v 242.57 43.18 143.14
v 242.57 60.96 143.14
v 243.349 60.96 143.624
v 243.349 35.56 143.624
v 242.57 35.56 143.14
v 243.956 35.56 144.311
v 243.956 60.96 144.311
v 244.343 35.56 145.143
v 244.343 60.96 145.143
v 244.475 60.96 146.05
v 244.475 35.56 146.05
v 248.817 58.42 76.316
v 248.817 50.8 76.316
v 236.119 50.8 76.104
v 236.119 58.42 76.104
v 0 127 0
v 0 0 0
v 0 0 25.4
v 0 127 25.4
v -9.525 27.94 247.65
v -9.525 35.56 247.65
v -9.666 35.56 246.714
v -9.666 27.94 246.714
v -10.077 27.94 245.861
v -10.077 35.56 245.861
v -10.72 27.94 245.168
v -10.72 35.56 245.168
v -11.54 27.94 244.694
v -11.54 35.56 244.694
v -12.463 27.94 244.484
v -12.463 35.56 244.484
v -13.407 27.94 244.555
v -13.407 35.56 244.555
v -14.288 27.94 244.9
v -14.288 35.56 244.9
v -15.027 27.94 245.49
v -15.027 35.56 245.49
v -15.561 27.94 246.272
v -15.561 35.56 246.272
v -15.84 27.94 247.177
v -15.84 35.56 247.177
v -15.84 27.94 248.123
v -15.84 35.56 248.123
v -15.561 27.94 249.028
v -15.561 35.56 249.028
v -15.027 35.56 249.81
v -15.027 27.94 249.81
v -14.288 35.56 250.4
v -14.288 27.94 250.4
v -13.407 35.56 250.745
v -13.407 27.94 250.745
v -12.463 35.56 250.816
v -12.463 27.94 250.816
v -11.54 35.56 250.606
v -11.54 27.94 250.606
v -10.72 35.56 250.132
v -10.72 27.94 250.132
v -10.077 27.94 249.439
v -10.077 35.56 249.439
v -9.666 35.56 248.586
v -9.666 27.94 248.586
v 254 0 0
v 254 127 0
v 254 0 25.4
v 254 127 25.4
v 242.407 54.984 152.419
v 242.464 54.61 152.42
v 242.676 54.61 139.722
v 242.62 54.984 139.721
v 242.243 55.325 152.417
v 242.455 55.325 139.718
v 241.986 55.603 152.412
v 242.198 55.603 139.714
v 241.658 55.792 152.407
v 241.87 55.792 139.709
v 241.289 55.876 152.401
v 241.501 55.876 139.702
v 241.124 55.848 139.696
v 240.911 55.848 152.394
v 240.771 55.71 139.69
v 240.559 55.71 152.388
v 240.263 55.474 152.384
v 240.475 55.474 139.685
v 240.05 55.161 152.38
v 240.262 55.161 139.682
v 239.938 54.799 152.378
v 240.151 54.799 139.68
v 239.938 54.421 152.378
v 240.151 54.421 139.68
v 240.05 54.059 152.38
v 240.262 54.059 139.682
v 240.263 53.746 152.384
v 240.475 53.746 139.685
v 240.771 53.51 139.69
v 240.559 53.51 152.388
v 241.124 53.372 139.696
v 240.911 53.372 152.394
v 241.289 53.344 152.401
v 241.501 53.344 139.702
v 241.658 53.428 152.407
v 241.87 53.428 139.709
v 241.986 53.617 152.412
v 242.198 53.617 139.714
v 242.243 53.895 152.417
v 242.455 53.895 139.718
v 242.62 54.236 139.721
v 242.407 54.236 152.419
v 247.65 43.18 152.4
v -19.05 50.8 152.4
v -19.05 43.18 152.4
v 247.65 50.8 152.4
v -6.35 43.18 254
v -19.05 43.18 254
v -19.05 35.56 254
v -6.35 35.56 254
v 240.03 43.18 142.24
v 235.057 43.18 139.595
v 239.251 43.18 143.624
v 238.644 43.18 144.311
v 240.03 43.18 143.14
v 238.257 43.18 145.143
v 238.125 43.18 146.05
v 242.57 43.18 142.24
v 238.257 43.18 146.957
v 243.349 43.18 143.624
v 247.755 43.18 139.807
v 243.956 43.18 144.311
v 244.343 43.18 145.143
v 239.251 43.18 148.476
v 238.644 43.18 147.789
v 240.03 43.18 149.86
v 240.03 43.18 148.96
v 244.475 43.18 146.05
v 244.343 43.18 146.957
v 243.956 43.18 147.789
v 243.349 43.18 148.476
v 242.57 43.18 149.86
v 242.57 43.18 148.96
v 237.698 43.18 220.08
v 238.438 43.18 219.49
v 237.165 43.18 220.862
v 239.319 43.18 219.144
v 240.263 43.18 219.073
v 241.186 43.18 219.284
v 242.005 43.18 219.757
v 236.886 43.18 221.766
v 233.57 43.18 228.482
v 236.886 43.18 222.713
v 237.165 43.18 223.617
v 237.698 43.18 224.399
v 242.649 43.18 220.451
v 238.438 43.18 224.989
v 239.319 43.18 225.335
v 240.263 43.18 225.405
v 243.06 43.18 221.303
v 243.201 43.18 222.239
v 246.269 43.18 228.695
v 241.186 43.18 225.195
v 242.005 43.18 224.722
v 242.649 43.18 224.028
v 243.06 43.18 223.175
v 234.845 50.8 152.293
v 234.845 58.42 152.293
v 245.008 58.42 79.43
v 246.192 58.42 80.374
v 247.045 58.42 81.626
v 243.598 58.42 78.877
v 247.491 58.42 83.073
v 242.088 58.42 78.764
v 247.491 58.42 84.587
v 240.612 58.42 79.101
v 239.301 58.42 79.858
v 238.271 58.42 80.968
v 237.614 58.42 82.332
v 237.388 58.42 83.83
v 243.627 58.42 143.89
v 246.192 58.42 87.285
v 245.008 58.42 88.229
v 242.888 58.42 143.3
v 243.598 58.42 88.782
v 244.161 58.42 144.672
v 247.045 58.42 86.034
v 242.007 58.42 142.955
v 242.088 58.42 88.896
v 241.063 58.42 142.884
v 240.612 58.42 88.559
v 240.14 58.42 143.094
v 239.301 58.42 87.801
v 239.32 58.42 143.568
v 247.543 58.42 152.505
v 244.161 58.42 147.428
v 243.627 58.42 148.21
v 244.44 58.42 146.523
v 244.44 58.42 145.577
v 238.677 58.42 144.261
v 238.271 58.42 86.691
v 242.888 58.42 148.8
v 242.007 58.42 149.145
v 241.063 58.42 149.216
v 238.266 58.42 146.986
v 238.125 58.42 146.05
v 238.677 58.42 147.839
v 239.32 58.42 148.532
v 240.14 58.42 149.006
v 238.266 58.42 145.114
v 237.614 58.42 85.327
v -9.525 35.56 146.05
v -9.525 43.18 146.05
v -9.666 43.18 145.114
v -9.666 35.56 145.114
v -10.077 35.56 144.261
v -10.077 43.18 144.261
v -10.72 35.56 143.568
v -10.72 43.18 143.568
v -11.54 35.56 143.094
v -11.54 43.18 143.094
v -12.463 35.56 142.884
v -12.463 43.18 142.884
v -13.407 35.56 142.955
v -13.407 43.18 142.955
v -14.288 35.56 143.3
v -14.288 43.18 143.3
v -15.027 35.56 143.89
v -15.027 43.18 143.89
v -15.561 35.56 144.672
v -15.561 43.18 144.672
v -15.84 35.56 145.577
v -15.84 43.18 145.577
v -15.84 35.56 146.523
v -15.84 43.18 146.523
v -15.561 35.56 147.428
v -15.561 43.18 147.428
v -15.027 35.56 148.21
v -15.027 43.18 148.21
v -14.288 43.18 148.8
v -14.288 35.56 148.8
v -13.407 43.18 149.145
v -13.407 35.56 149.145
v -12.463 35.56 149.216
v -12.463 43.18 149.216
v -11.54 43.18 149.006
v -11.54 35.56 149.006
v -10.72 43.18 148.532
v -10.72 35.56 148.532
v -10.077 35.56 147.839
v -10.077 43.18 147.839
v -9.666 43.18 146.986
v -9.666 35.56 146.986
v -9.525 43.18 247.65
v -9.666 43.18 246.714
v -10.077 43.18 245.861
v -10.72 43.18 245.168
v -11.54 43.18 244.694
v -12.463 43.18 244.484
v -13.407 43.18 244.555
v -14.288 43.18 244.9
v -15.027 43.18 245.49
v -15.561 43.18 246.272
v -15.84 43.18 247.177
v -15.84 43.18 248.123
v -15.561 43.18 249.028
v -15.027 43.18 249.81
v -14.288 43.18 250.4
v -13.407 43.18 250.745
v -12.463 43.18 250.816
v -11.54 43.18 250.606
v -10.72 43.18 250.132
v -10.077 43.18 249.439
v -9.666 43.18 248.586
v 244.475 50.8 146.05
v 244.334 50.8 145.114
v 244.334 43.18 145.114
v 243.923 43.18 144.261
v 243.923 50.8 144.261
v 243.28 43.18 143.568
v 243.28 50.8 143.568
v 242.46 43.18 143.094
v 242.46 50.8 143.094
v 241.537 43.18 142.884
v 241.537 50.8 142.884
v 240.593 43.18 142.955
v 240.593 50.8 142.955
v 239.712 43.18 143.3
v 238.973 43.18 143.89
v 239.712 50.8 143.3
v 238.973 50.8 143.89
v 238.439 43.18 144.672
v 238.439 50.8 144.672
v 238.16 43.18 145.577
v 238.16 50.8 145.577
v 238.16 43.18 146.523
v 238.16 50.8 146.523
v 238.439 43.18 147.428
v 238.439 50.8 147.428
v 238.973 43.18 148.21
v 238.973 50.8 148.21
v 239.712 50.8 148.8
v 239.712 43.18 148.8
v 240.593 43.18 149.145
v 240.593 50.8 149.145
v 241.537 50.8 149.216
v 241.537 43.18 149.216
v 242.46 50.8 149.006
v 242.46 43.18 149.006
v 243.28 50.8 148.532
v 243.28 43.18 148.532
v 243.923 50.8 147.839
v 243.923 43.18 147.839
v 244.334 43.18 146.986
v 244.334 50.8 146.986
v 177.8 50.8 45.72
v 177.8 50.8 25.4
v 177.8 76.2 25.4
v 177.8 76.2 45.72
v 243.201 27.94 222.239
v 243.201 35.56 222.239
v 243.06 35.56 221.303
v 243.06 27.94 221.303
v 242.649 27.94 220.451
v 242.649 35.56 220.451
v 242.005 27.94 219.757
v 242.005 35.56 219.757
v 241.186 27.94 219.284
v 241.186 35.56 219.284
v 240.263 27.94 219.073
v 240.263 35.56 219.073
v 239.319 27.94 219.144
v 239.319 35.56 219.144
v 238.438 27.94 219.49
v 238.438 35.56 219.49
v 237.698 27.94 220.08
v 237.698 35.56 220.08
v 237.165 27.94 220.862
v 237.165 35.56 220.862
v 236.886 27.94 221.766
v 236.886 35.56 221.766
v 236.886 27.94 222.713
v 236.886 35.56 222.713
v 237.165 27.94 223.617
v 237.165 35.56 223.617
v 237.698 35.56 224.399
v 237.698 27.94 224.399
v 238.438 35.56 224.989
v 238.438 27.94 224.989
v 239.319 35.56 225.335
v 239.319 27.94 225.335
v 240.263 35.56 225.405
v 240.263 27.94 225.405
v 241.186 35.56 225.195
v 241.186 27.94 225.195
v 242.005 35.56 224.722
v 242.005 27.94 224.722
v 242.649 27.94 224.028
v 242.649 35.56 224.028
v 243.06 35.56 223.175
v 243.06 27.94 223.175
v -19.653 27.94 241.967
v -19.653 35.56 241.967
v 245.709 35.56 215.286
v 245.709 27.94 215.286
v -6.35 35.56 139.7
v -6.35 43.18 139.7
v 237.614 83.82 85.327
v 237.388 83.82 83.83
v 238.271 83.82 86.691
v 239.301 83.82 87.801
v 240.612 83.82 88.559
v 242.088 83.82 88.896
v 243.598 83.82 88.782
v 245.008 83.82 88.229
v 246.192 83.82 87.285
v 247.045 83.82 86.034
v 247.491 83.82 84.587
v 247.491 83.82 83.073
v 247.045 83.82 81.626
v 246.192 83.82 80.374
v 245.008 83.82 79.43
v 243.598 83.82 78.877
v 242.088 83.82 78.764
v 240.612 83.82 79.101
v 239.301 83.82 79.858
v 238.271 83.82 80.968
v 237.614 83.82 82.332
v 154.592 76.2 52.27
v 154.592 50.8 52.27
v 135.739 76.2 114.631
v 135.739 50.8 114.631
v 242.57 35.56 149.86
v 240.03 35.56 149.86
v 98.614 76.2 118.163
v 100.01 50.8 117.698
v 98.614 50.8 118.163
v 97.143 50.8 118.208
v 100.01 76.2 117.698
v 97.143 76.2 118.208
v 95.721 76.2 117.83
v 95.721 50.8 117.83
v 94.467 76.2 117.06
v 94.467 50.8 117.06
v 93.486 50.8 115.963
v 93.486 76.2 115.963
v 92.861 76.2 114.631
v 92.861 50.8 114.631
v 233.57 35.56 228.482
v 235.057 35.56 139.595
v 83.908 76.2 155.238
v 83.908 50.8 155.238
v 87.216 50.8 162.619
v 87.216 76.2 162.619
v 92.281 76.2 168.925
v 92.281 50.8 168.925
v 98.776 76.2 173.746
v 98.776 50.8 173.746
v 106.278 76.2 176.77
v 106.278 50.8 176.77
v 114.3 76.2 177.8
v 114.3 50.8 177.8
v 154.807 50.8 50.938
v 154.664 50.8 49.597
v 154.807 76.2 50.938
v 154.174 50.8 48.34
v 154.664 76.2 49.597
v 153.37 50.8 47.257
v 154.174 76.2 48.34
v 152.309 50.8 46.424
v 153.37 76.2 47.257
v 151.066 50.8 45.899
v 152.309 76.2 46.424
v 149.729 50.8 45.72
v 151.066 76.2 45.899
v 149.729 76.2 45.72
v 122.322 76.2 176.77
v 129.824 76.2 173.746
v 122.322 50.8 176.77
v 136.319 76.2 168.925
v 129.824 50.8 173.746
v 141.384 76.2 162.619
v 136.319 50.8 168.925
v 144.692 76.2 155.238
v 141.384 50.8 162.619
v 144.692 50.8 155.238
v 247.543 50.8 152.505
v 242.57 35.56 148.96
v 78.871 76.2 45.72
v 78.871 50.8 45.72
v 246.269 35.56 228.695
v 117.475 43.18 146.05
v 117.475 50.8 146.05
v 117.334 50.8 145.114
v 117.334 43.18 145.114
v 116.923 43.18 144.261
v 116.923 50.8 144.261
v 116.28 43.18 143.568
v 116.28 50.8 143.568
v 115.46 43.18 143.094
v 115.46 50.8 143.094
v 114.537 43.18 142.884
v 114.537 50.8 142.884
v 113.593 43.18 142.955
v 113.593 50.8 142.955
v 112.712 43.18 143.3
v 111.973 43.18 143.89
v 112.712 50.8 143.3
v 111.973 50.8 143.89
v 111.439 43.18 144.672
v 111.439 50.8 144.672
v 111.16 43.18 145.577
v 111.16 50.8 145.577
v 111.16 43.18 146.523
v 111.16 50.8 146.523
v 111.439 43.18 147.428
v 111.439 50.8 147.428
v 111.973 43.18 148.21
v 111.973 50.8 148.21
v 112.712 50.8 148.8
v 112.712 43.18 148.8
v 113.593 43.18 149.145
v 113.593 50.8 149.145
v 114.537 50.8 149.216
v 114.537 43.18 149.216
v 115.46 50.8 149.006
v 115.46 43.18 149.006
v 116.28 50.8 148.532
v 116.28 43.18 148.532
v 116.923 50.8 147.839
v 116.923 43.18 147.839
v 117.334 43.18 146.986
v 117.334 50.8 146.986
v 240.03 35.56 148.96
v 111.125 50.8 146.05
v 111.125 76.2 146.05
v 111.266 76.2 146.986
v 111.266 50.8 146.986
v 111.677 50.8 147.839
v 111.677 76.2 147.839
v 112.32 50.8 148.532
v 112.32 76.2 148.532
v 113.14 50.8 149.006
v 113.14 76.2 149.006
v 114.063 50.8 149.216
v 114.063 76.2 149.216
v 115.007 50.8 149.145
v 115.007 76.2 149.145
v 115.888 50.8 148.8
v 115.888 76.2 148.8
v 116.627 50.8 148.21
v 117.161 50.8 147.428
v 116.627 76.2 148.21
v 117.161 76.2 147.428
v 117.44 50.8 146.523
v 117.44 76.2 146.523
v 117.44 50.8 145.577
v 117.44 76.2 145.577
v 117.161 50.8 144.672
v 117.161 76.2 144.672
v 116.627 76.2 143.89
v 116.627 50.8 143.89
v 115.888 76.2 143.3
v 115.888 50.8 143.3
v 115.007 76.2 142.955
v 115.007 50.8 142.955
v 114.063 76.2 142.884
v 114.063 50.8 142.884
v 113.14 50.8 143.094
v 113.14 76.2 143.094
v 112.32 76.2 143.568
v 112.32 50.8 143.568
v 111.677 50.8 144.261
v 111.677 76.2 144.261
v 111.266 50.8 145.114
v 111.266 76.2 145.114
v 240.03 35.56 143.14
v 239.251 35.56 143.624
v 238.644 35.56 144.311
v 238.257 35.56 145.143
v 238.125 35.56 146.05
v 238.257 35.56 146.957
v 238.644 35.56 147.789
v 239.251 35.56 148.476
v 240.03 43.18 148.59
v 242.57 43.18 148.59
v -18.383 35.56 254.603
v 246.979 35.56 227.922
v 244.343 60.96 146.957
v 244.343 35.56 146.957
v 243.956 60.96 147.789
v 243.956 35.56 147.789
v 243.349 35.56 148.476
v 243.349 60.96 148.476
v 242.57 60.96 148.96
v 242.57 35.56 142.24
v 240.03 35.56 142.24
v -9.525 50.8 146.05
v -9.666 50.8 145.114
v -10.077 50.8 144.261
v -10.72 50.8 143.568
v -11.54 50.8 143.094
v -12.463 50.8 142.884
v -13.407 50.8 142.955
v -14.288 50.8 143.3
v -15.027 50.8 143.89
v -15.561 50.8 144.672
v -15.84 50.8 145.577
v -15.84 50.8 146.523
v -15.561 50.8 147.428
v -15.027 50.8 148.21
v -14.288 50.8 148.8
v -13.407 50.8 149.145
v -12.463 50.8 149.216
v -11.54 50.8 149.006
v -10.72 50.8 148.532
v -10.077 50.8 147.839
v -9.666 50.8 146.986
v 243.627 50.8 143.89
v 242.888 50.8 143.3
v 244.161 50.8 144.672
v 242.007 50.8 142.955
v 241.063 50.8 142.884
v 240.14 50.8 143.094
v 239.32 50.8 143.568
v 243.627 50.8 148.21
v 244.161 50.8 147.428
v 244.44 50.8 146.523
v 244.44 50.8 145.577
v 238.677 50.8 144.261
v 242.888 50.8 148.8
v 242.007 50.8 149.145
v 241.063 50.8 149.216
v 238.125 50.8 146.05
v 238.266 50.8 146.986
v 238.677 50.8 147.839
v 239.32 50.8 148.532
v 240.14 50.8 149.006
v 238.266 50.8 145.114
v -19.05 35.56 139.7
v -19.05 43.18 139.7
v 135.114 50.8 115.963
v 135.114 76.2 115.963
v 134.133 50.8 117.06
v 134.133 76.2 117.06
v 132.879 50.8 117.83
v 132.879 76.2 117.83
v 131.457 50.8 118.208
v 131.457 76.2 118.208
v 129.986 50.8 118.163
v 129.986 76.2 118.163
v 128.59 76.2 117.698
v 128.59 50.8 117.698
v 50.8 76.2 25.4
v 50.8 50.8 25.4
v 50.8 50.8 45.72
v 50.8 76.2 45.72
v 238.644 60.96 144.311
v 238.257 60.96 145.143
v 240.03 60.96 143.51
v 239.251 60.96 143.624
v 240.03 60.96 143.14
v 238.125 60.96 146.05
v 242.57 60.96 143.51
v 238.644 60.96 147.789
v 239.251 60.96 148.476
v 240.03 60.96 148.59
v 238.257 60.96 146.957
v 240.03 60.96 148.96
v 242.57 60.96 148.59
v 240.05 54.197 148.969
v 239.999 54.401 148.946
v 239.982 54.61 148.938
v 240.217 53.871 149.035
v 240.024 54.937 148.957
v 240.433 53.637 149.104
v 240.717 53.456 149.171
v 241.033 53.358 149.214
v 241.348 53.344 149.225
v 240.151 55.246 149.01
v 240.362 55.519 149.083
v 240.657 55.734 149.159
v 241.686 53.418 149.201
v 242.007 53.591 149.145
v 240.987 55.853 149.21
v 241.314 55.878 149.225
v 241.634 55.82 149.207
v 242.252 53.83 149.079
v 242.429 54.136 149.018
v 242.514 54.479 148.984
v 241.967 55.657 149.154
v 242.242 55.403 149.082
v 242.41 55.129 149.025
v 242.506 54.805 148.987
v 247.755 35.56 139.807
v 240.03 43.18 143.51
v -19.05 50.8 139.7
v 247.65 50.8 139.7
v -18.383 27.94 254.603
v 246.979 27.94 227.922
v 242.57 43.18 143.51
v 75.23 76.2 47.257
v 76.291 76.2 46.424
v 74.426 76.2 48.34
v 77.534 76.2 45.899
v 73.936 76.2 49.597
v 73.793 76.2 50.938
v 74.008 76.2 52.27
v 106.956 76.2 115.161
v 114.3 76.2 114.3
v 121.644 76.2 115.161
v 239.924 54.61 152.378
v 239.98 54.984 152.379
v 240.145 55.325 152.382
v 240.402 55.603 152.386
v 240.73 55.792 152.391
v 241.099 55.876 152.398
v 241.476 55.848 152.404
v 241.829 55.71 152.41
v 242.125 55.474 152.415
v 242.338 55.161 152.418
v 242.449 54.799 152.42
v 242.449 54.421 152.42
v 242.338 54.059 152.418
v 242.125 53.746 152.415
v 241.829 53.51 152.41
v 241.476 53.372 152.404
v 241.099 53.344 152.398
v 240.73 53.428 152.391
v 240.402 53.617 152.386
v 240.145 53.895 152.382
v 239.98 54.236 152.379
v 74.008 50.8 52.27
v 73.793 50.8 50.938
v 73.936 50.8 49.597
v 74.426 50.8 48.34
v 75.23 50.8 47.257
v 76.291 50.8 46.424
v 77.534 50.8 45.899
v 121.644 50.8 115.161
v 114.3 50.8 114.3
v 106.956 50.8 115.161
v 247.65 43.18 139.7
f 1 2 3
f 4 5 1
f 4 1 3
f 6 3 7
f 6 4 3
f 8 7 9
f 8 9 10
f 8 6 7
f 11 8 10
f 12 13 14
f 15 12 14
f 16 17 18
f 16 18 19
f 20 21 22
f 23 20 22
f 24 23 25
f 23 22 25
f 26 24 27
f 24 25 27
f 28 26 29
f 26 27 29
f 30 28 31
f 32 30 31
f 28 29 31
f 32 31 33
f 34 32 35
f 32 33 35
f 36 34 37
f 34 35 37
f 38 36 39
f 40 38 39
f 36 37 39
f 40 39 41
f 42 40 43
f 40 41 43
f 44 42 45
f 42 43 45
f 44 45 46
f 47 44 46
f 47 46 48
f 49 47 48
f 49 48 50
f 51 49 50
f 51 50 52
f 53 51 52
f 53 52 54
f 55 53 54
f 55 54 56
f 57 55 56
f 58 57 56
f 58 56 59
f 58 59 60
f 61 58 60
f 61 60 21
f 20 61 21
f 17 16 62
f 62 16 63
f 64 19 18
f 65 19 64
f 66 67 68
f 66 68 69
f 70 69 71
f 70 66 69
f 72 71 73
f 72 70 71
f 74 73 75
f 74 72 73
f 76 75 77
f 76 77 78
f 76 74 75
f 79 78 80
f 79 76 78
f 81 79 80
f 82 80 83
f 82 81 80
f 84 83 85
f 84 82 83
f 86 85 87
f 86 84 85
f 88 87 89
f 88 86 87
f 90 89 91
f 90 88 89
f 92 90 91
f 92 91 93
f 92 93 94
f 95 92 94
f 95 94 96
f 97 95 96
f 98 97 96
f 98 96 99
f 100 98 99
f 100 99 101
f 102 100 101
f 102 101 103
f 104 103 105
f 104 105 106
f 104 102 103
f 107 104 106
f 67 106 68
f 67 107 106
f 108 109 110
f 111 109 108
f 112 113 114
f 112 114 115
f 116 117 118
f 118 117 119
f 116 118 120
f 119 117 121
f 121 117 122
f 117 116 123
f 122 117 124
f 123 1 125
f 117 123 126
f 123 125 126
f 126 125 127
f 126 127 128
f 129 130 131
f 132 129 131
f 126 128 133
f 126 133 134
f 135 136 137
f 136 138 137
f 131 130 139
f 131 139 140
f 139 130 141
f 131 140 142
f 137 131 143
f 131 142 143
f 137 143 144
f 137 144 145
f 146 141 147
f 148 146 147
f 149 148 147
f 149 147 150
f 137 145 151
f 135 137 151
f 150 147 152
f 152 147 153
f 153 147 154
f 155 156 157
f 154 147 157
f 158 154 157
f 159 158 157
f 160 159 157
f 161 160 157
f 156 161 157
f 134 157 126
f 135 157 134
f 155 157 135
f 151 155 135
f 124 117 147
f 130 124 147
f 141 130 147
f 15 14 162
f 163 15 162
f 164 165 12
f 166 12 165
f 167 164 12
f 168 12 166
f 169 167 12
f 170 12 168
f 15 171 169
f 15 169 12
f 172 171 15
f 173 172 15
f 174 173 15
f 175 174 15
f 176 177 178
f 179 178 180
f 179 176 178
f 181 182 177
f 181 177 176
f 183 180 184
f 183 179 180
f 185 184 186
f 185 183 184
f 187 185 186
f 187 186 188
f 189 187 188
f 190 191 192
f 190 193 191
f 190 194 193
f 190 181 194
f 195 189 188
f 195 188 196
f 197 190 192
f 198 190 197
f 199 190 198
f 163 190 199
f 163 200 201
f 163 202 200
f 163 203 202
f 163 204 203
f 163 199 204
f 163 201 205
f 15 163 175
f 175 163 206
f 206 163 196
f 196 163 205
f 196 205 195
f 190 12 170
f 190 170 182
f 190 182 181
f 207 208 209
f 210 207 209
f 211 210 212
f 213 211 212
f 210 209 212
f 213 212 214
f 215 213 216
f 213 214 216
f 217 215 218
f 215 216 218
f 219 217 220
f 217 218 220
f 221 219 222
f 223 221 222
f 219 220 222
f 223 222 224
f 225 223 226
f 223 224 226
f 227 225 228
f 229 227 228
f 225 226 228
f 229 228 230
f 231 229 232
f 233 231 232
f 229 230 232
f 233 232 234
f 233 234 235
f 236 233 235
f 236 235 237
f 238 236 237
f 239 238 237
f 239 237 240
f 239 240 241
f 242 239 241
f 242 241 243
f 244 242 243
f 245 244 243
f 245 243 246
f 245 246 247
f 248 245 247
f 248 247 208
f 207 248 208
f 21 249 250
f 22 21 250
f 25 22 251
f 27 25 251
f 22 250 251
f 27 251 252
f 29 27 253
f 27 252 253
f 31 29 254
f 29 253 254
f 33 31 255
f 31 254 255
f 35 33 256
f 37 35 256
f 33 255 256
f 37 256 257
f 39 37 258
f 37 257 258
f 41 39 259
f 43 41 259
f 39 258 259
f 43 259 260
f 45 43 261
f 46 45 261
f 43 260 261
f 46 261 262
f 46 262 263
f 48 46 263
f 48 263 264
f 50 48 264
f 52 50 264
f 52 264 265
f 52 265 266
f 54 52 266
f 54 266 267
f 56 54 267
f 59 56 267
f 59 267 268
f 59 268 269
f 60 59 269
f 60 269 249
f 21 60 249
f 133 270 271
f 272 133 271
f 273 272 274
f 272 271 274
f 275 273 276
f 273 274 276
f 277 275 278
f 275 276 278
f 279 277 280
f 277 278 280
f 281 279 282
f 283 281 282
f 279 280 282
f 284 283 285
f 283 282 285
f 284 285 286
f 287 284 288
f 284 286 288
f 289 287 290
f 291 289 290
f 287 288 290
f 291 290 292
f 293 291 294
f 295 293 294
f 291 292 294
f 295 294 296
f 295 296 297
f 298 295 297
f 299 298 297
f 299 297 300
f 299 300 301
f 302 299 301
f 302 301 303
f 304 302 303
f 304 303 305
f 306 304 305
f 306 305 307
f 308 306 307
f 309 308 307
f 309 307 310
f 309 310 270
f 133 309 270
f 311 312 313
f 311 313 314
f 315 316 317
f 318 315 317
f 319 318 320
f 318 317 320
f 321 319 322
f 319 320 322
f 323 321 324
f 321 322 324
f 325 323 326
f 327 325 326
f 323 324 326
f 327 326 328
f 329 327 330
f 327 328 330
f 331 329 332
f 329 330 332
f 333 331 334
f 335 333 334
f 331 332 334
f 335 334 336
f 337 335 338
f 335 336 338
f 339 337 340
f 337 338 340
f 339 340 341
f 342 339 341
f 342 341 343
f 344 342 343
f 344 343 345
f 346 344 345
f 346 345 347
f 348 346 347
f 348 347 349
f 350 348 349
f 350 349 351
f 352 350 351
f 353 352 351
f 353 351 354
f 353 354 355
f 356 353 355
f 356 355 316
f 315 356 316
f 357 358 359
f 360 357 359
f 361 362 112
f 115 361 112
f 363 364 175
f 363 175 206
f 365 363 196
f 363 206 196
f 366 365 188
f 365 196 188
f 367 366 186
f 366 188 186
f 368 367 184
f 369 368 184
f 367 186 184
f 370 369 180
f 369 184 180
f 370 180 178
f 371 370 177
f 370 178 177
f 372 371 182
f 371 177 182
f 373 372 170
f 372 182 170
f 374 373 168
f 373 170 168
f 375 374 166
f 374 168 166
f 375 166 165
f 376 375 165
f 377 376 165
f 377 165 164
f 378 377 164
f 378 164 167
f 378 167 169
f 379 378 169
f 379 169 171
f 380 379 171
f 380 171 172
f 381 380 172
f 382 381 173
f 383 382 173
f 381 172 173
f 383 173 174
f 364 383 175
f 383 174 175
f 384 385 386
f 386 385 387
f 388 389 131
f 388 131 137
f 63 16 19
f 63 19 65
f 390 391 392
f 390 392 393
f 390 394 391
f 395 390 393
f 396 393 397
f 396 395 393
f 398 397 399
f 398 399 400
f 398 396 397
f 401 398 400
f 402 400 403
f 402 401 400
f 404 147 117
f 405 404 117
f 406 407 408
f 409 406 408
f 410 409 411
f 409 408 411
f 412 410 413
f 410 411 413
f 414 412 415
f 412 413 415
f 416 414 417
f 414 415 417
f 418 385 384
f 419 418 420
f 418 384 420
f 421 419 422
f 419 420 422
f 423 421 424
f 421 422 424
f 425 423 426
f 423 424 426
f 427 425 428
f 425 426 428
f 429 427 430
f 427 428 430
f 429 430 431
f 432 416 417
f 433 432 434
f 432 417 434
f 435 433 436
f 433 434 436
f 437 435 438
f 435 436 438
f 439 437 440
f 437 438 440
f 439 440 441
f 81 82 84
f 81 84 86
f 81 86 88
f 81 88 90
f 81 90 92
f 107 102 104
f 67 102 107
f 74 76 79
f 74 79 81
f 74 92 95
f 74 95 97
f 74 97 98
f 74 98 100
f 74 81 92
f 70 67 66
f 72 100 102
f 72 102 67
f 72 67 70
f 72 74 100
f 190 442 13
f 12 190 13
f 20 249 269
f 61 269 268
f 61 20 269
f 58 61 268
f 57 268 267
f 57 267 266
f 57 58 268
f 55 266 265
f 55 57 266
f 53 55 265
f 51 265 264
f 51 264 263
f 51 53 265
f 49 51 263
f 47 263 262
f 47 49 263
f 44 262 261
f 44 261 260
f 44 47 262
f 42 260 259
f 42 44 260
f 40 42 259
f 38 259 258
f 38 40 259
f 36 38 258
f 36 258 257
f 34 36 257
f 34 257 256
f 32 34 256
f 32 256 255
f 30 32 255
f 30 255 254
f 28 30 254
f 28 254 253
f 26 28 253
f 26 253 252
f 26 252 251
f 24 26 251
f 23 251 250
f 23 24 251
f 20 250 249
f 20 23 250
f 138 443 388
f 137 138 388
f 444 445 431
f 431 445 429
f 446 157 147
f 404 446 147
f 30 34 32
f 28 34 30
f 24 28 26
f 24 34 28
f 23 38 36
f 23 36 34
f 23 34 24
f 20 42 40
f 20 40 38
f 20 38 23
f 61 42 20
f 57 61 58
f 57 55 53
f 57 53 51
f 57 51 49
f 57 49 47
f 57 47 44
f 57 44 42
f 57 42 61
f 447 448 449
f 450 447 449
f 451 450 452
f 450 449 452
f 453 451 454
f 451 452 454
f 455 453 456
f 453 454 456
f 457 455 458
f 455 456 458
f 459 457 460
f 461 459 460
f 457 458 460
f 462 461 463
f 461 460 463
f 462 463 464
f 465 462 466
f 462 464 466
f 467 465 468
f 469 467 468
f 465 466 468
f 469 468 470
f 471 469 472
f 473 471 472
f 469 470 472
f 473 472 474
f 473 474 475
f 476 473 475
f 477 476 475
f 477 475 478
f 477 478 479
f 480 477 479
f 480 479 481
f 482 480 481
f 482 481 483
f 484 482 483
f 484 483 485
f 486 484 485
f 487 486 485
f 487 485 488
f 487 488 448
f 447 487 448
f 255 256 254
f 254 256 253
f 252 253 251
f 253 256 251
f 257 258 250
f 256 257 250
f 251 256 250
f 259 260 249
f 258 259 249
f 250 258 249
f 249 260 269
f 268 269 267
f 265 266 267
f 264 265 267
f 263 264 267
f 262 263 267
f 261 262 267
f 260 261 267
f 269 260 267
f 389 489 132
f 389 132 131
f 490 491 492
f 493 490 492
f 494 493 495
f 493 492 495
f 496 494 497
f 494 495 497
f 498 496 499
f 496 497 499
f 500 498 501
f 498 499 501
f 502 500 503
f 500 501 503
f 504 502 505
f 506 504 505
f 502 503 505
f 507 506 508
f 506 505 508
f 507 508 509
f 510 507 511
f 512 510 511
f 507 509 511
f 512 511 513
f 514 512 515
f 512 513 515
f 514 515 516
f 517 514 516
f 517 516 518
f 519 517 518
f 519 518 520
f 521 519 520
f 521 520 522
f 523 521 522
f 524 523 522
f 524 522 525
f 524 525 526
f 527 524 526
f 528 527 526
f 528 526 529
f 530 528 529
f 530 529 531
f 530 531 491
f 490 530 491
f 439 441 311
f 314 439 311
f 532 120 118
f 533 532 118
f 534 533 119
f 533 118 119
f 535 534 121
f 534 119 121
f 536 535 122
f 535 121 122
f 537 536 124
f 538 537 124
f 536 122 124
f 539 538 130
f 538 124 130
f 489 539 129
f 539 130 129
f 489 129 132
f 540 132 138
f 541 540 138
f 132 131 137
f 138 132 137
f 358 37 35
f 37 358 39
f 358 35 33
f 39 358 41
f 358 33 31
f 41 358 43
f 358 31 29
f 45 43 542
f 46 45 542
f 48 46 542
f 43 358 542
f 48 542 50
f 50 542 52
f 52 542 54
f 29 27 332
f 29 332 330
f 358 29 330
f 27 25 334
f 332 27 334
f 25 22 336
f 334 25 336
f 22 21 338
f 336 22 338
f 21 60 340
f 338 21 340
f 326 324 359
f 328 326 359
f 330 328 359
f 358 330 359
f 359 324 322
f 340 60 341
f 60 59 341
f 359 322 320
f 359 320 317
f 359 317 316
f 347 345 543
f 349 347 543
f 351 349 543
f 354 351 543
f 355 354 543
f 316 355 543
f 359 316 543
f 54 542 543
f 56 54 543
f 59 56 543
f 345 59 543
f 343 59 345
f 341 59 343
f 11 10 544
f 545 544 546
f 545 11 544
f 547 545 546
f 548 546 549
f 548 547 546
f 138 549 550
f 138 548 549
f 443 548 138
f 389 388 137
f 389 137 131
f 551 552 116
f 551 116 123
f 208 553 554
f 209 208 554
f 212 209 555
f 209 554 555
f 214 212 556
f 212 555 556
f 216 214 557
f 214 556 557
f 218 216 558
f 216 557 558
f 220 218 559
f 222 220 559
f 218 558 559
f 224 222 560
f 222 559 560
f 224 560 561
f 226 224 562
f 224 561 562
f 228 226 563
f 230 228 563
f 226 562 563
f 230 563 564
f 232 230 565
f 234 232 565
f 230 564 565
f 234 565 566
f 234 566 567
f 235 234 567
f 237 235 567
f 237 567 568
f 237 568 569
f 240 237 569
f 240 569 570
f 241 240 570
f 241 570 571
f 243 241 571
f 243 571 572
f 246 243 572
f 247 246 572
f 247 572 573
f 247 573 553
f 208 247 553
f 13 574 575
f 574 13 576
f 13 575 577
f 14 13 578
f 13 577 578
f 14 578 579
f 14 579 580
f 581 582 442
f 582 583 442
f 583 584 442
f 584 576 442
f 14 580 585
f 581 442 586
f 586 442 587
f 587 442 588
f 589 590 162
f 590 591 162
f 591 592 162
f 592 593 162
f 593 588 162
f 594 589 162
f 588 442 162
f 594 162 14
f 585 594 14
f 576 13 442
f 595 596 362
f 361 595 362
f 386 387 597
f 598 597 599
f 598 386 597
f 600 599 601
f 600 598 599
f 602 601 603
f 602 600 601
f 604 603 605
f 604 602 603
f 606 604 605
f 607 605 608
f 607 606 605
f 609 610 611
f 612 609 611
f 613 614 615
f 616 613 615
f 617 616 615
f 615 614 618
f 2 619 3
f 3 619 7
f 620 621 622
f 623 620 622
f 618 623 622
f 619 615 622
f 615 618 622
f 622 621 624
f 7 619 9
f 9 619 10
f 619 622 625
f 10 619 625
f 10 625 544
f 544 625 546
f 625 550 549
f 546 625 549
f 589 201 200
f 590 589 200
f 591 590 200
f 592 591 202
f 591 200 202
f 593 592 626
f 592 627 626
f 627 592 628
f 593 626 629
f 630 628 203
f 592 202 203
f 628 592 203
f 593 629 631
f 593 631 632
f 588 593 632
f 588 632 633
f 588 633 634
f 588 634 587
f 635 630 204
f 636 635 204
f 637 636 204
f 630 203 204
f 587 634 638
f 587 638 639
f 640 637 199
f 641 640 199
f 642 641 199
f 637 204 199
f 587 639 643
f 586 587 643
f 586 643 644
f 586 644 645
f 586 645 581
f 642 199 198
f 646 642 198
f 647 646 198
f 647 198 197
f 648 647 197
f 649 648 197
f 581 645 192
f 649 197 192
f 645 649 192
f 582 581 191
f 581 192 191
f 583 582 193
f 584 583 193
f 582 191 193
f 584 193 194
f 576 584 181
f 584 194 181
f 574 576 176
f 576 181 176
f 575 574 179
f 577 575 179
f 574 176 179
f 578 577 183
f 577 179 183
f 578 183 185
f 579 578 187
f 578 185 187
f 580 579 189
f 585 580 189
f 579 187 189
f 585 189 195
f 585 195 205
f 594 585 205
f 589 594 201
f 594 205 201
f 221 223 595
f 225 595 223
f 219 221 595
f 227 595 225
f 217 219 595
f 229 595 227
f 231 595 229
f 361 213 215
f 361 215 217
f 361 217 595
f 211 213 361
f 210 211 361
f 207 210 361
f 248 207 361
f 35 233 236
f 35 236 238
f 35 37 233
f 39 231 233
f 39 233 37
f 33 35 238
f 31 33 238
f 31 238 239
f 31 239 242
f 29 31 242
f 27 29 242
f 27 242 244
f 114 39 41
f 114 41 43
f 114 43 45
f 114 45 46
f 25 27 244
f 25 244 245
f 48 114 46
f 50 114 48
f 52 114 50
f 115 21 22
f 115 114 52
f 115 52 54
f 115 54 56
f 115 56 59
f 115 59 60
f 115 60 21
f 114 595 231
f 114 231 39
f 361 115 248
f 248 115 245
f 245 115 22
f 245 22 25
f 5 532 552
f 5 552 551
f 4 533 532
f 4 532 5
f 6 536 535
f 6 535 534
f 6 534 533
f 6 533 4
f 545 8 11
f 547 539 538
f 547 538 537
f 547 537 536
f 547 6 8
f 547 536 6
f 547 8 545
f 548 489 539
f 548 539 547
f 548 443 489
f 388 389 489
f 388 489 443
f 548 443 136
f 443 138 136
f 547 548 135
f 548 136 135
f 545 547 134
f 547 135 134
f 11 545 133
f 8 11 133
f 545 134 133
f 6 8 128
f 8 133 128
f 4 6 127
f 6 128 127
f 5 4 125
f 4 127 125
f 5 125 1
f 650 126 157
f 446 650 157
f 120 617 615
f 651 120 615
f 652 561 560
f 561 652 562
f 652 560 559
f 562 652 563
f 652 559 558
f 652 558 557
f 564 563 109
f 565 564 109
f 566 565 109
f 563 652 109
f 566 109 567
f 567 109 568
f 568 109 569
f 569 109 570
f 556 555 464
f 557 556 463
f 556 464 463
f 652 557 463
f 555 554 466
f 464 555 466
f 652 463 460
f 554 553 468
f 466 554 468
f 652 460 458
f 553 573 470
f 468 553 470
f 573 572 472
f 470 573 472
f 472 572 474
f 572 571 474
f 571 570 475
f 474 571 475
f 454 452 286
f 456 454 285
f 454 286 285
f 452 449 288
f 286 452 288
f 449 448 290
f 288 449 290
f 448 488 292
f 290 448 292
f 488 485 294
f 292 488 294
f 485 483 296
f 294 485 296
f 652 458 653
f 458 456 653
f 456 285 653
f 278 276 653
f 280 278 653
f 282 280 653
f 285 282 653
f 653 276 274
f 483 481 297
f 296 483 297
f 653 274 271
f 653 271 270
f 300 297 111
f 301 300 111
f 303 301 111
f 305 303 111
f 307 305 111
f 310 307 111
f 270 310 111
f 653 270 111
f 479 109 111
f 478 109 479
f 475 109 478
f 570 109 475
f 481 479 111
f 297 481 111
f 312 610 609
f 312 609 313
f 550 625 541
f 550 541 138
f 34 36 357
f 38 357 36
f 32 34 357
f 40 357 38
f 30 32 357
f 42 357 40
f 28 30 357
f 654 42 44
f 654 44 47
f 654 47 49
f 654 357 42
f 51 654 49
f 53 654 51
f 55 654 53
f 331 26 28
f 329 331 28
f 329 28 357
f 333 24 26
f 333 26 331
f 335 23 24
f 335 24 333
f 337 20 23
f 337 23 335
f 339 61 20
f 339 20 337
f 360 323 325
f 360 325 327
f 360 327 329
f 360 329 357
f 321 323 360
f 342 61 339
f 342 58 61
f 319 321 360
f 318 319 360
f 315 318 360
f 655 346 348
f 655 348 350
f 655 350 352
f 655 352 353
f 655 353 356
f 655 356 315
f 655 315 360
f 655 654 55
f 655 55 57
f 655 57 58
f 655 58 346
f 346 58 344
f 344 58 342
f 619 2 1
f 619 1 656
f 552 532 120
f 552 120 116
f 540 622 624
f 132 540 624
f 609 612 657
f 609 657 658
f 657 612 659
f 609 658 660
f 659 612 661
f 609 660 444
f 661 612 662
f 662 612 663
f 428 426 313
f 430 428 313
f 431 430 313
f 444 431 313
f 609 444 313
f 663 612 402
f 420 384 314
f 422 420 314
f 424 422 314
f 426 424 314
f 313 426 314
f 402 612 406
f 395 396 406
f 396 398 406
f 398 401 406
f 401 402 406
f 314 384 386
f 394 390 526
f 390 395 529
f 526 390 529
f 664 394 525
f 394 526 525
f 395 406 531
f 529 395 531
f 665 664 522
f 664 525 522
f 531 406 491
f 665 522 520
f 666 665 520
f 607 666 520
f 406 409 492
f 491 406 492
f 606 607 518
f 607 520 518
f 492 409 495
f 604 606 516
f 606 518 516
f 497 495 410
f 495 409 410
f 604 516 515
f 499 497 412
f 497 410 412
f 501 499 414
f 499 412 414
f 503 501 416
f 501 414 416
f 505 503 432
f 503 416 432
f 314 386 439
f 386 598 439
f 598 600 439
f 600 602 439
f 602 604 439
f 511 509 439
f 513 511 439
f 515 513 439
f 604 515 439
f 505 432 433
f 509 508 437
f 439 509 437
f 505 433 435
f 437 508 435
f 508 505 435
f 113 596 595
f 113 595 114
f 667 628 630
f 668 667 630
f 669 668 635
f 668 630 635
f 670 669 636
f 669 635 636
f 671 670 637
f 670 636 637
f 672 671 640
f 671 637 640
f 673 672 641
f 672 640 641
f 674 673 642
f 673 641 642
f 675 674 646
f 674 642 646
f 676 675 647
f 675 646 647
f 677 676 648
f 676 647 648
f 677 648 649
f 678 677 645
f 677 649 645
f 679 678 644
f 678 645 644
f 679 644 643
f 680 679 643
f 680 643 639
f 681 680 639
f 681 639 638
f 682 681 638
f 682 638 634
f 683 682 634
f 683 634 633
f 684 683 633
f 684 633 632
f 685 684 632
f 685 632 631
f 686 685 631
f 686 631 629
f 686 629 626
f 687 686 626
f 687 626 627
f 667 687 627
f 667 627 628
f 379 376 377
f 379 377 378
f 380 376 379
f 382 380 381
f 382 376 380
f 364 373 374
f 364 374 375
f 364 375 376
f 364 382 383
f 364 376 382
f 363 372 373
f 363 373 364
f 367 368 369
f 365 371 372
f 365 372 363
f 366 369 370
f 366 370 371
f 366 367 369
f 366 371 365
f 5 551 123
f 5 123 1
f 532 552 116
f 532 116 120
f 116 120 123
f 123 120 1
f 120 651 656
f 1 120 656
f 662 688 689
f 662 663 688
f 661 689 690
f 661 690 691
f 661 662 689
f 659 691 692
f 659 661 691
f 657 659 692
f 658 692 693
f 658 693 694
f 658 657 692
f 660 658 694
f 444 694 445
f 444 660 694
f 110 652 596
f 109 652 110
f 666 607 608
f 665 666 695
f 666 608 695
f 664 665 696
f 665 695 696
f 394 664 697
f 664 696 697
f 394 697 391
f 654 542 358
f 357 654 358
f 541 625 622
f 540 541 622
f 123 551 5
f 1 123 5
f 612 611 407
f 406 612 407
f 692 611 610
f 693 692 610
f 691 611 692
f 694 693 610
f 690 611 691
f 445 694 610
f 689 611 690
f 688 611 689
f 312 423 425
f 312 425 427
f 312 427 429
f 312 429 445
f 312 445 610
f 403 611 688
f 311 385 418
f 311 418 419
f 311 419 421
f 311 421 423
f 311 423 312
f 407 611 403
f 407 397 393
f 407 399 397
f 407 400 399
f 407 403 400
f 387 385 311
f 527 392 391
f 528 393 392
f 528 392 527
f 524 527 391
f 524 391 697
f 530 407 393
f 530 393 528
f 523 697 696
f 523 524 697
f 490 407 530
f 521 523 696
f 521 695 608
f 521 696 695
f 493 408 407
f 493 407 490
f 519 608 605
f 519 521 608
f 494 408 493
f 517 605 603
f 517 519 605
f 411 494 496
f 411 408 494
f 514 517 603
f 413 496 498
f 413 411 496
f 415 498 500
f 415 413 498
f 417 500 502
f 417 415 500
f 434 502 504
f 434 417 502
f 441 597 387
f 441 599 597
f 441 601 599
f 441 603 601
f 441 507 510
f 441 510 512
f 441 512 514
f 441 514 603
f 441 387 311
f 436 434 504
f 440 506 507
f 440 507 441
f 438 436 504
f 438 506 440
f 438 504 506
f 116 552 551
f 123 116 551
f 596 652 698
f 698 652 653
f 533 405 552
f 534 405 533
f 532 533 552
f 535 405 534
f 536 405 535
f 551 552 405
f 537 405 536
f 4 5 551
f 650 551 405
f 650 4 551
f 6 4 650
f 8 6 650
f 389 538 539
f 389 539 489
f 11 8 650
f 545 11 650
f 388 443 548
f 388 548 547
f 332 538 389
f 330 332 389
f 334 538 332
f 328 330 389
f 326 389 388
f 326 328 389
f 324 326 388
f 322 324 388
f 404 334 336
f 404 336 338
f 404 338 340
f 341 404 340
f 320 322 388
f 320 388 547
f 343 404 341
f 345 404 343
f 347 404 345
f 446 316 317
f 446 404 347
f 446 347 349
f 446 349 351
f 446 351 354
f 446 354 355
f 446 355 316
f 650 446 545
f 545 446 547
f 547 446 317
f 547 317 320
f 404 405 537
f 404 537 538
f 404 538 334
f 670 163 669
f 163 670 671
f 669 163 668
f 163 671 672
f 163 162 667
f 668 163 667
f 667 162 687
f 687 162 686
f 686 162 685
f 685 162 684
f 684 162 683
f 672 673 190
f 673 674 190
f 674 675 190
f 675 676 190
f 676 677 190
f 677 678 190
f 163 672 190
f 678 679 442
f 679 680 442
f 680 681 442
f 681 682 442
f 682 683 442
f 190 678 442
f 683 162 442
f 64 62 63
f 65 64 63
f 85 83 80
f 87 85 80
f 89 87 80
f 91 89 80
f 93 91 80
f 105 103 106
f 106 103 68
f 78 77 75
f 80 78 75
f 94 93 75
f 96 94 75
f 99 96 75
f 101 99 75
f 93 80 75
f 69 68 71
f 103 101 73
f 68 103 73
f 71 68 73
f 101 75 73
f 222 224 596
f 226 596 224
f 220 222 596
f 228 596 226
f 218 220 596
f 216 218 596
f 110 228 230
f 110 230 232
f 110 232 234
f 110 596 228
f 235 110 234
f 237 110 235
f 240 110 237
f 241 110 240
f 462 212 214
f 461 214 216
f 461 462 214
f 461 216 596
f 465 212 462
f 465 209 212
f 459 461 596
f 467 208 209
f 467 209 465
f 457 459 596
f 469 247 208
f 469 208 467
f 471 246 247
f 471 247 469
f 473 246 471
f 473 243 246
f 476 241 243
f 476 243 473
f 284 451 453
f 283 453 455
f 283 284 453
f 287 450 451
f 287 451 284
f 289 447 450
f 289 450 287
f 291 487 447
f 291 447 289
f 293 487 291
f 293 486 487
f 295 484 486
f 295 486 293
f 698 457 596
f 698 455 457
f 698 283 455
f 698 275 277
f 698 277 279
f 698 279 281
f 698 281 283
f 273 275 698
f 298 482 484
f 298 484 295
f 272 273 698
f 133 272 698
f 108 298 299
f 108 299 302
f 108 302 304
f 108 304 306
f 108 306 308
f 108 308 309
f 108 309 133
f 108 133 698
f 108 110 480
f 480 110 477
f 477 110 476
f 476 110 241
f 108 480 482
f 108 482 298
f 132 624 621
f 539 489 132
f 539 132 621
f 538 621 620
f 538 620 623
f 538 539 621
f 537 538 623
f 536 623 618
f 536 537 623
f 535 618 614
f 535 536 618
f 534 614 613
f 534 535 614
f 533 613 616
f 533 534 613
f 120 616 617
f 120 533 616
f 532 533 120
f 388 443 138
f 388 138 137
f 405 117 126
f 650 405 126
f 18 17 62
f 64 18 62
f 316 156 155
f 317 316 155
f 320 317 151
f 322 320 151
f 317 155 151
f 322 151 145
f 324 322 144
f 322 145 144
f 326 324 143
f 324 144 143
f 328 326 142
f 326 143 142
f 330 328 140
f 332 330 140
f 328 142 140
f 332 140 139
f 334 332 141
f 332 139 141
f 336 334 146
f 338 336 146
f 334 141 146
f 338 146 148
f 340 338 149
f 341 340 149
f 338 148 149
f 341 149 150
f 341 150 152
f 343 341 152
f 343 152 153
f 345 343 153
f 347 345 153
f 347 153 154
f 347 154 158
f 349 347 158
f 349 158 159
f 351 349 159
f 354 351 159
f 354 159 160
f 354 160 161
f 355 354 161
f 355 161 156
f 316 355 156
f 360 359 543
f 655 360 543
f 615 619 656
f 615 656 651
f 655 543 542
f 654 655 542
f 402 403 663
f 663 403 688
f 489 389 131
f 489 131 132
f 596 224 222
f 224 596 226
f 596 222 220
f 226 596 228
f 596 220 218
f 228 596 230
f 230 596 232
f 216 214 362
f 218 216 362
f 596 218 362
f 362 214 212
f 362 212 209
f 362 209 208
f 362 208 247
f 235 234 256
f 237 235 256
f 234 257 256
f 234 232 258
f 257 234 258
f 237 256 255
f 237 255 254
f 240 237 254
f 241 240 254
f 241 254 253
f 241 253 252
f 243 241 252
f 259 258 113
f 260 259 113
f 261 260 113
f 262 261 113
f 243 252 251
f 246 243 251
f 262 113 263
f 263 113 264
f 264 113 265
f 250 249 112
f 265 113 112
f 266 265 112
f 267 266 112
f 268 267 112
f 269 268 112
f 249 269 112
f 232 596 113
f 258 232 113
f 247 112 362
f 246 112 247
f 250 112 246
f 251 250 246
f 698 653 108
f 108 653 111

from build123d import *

# Parameters (mm, degrees)
F0_W        = 254
F0_H        = 127
F1_DEPTH    = 25.4
F3_W        = 127
F3_H        = 152.4
F4_DEPTH    = 12.7
F6_DEPTH    = 76.201
F7_R        = 5.08
F9_W        = 266.7
F9_H        = 12.7
F10_DEPTH   = 7.62
F11_W       = 12.7
F11_H       = 114.3
F12_DEPTH   = 7.62
F14_DEPTH   = 7.62
F16_DEPTH   = 7.62
F17_D       = 6.35
F17_DEPTH   = 22.861
F17_2_D     = 6.35
F17_2_DEPTH = 22.861
F17_3_D     = 6.35
F17_3_DEPTH = 22.861
F17_4_D     = 6.35
F17_4_DEPTH = 22.861
F18_D       = 6.35
F21_DEPTH   = 7.62
F22_R       = 5.08
F23_DEPTH   = 25.4
F24_R       = 3.175
F25_DEPTH   = 15.24
F26_D       = 6.35
F27_W       = 2.54
F27_H       = 7.62
F28_DEPTH   = 91.441
F30_DEPTH   = 25.4
F31_DEPTH   = 7.62
F32_W       = 2.54
F32_H       = 1.27
F33_DEPTH   = 17.78
F35_D       = 2.54
F35_DEPTH   = 7.62
F35_TIP     = 0.7630929862
F36_R       = 1.27
F37_DEPTH   = 12.7


with BuildPart() as f1:
    # F0 (on Top) → F1 (new body)
    with BuildSketch(Plane.XY):
        with Locations((127, 63.5)):
            Rectangle(F0_W, F0_H)
    extrude(amount=F1_DEPTH)


with BuildPart() as f4:
    # F3 (on mid) → F4 (new body, symmetric)
    with BuildSketch(Plane.XZ.offset(-63.5)):
        with Locations((114.3, 101.6)):
            Rectangle(F3_W, F3_H)
    extrude(amount=F4_DEPTH, both=True)

    # F5 (on face) → F6 (cut, through all)
    with BuildSketch(Plane.XZ.offset(-50.8)):
        with BuildLine():
            Line((156.5717554914, 45.72), (133.8126678121, 121.0036770193))
            ThreePointArc((133.8126678121, 121.0036770193), (114.3, 114.3), (94.7873321879, 121.0036770193))
            Line((94.7873321879, 121.0036770193), (72.0282445086, 45.72))
            Line((72.0282445086, 45.72), (156.5717554914, 45.72))
        make_face()
        with BuildLine():
            ThreePointArc((83.9084148767, 155.2377121033), (95.3744532349, 171.5428652693), (114.3, 177.8))
            Line((114.3, 177.8), (50.8, 177.8))
            Line((50.8, 177.8), (50.8, 45.72))
            Line((50.8, 45.72), (83.9084148767, 155.2377121033))
        make_face()
        with BuildLine():
            ThreePointArc((114.3, 177.8), (133.2255467651, 171.5428652693), (144.6915851233, 155.2377121033))
            Line((144.6915851233, 155.2377121033), (177.8, 45.72))
            Line((177.8, 45.72), (177.8, 177.8))
            Line((177.8, 177.8), (114.3, 177.8))
        make_face()
    extrude(amount=-F6_DEPTH, mode=Mode.SUBTRACT)

    # F7
    f7_edges = [f4.edges().sort_by_distance(p)[0] for p in [
        (72.028245, 63.5, 45.72),
        (156.571755, 63.5, 45.72),
        (94.787332, 63.5, 121.003677),
        (133.812668, 63.5, 121.003677),
    ]]
    fillet(f7_edges, radius=F7_R)

    # F18 (through all)
    with Locations(Plane.XZ.offset(-50.8)):
        with Locations((114.3, 146.05)):
            Hole(F18_D / 2)


with BuildPart() as f10:
    # F9 (on face) → F10 (new body)
    with BuildSketch(Plane.XZ.offset(-50.8)):
        with Locations((114.3, 146.05)):
            Rectangle(F9_W, F9_H)
    extrude(amount=F10_DEPTH)

    # F17 (through all, one way)
    with BuildSketch(Plane(origin=(0, 50.8, 0), x_dir=(1, 0, 0), z_dir=(0, 1, 0))):
        with Locations((-12.7, -247.65), (-12.7, -146.05), (114.3, -146.05), (241.3, -146.05), (240.025737907, -222.2393447676)):
            Circle(F17_D / 2)
    extrude(amount=-F17_DEPTH, mode=Mode.SUBTRACT)


with BuildPart() as f12:
    # F11 (on face) → F12 (new body)
    with BuildSketch(Plane.XZ.offset(-43.18)):
        with Locations((-12.7, 196.85)):
            Rectangle(F11_W, F11_H)
    extrude(amount=F12_DEPTH)

    # F17#2 (through all, one way)
    with BuildSketch(Plane(origin=(0, 50.8, 0), x_dir=(1, 0, 0), z_dir=(0, 1, 0))):
        with Locations((-12.7, -247.65), (-12.7, -146.05), (114.3, -146.05), (241.3, -146.05), (240.025737907, -222.2393447676)):
            Circle(F17_2_D / 2)
    extrude(amount=-F17_2_DEPTH, mode=Mode.SUBTRACT)


with BuildPart() as f14:
    # F13 (on face) → F14 (new body)
    with BuildSketch(Plane.XZ.offset(-35.56)):
        Polygon((-19.6534098285, 241.9671229331), (245.7086149739, 215.2859349391), (246.9791477355, 227.9222218345), (-18.3828770669, 254.6034098285), align=None)
    extrude(amount=F14_DEPTH)

    # F17#3 (through all, one way)
    with BuildSketch(Plane(origin=(0, 50.8, 0), x_dir=(1, 0, 0), z_dir=(0, 1, 0))):
        with Locations((-12.7, -247.65), (-12.7, -146.05), (114.3, -146.05), (241.3, -146.05), (240.025737907, -222.2393447676)):
            Circle(F17_3_D / 2)
    extrude(amount=-F17_3_DEPTH, mode=Mode.SUBTRACT)


with BuildPart() as f16:
    # F15 (on face) → F16 (new body)
    with BuildSketch(Plane.XZ.offset(-43.18)):
        Polygon((247.7553005717, 139.8070764438), (246.2686614633, 228.6946453393), (233.5704373353, 228.4822683238), (235.0570764438, 139.5946994283), align=None)
    extrude(amount=F16_DEPTH)

    # F17#4 (through all, one way)
    with BuildSketch(Plane(origin=(0, 50.8, 0), x_dir=(1, 0, 0), z_dir=(0, 1, 0))):
        with Locations((-12.7, -247.65), (-12.7, -146.05), (114.3, -146.05), (241.3, -146.05), (240.025737907, -222.2393447676)):
            Circle(F17_4_D / 2)
    extrude(amount=-F17_4_DEPTH, mode=Mode.SUBTRACT)

    # F27 (on face) → F28 (cut, through all)
    with BuildSketch(Plane.XZ.offset(-35.56)):
        with Locations((241.3, 146.05)):
            Rectangle(F27_W, F27_H)
    extrude(amount=-F28_DEPTH, mode=Mode.SUBTRACT)


with BuildPart() as f21:
    # F20 (on face) → F21 (new body)
    with BuildSketch(Plane(origin=(0, 50.8, 0), x_dir=(-1, 0, 0), z_dir=(0, 1, 0))):
        Polygon((-248.8171856492, 76.3159558041), (-236.1189615212, 76.1035787886), (-234.8446994283, 152.2929235562), (-247.5429235562, 152.5053005717), align=None)
    extrude(amount=F21_DEPTH)

    # F22 (on face) → F23 (join)
    with BuildSketch(Plane(origin=(0, 58.42, 0), x_dir=(-1, 0, 0), z_dir=(0, 1, 0))):
        with Locations((-242.4680735852, 83.8297672964)):
            Circle(F22_R)
    extrude(amount=F23_DEPTH)

    # F26 (through all)
    with Locations(Plane.XZ.offset(-35.56)):
        with Locations((241.3, 146.05)):
            Hole(F26_D / 2)

    # F35
    with Locations(Plane(origin=(-2.4807042479, 0, 148.3236708146), x_dir=(0.9998601676, 0, 0.0167225996), z_dir=(-0.0167225996, 0, 0.9998601676))):
        with Locations((243.7085941089, 54.61)):
            Hole(F35_D / 2, depth=F35_DEPTH)
            with Locations((0, 0, -(F35_DEPTH + F35_TIP / 2))):  # 118° drill point
                Cone(0, F35_D / 2, F35_TIP, mode=Mode.SUBTRACT)


with BuildPart() as f25:
    # F24 (on face) → F25 (new body)
    with BuildSketch(Plane.XZ.offset(-27.94)):
        with Locations((-12.7, 247.65)):
            Circle(F24_R)
    extrude(amount=-F25_DEPTH)


with BuildPart() as f30:
    # F29 (on face) → F30 (new body)
    with BuildSketch(Plane.XZ.offset(-35.56)):
        with BuildLine():
            ThreePointArc((244.475, 146.05), (243.9563955842, 147.7890191201), (242.57, 148.9599355663))
            ThreePointArc((242.57, 148.9599355663), (241.3, 149.225), (240.03, 148.9599355663))
            ThreePointArc((240.03, 148.9599355663), (238.125, 146.05), (240.03, 143.1400644337))
            ThreePointArc((240.03, 143.1400644337), (241.3, 142.875), (242.57, 143.1400644337))
            ThreePointArc((242.57, 143.1400644337), (243.9563955842, 144.3109808799), (244.475, 146.05))
        make_face()
    extrude(amount=-F30_DEPTH)

    # F29 (on face) → F31 (join)
    with BuildSketch(Plane.XZ.offset(-35.56)):
        with BuildLine():
            Line((242.57, 148.9599355663), (242.57, 149.86))
            Line((242.57, 149.86), (240.03, 149.86))
            Line((240.03, 149.86), (240.03, 148.9599355663))
            ThreePointArc((240.03, 148.9599355663), (241.3, 149.225), (242.57, 148.9599355663))
        make_face()
        with BuildLine():
            ThreePointArc((244.475, 146.05), (243.9563955842, 147.7890191201), (242.57, 148.9599355663))
            ThreePointArc((242.57, 148.9599355663), (241.3, 149.225), (240.03, 148.9599355663))
            ThreePointArc((240.03, 148.9599355663), (238.125, 146.05), (240.03, 143.1400644337))
            ThreePointArc((240.03, 143.1400644337), (241.3, 142.875), (242.57, 143.1400644337))
            ThreePointArc((242.57, 143.1400644337), (243.9563955842, 144.3109808799), (244.475, 146.05))
        make_face()
        with BuildLine():
            ThreePointArc((242.57, 143.1400644337), (241.3, 142.875), (240.03, 143.1400644337))
            Line((240.03, 143.1400644337), (240.03, 142.24))
            Line((240.03, 142.24), (242.57, 142.24))
            Line((242.57, 142.24), (242.57, 143.1400644337))
        make_face()
    extrude(amount=-F31_DEPTH)

    # F32 (on face) → F33 (cut, through all)
    with BuildSketch(Plane(origin=(0, 60.96, 0), x_dir=(-1, 0, 0), z_dir=(0, 1, 0))):
        with Locations((-241.3, 149.225)):
            Rectangle(F32_W, F32_H)
        with Locations((-241.3, 142.875)):
            Rectangle(F32_W, F32_H)
    extrude(amount=-F33_DEPTH, mode=Mode.SUBTRACT)


with BuildPart() as f37:
    # F36 (on face) → F37 (new body)
    with BuildSketch(Plane(origin=(-2.4807042479, 0, 148.3236708146), x_dir=(0.9998601676, 0, 0.0167225996), z_dir=(-0.0167225996, 0, 0.9998601676))):
        with Locations((243.7085941089, 54.61)):
            Circle(F36_R)
    extrude(amount=-F37_DEPTH)


solid = Compound([f1.part, f4.part, f10.part, f12.part, f14.part, f16.part, f21.part, f25.part, f30.part, f37.part])
